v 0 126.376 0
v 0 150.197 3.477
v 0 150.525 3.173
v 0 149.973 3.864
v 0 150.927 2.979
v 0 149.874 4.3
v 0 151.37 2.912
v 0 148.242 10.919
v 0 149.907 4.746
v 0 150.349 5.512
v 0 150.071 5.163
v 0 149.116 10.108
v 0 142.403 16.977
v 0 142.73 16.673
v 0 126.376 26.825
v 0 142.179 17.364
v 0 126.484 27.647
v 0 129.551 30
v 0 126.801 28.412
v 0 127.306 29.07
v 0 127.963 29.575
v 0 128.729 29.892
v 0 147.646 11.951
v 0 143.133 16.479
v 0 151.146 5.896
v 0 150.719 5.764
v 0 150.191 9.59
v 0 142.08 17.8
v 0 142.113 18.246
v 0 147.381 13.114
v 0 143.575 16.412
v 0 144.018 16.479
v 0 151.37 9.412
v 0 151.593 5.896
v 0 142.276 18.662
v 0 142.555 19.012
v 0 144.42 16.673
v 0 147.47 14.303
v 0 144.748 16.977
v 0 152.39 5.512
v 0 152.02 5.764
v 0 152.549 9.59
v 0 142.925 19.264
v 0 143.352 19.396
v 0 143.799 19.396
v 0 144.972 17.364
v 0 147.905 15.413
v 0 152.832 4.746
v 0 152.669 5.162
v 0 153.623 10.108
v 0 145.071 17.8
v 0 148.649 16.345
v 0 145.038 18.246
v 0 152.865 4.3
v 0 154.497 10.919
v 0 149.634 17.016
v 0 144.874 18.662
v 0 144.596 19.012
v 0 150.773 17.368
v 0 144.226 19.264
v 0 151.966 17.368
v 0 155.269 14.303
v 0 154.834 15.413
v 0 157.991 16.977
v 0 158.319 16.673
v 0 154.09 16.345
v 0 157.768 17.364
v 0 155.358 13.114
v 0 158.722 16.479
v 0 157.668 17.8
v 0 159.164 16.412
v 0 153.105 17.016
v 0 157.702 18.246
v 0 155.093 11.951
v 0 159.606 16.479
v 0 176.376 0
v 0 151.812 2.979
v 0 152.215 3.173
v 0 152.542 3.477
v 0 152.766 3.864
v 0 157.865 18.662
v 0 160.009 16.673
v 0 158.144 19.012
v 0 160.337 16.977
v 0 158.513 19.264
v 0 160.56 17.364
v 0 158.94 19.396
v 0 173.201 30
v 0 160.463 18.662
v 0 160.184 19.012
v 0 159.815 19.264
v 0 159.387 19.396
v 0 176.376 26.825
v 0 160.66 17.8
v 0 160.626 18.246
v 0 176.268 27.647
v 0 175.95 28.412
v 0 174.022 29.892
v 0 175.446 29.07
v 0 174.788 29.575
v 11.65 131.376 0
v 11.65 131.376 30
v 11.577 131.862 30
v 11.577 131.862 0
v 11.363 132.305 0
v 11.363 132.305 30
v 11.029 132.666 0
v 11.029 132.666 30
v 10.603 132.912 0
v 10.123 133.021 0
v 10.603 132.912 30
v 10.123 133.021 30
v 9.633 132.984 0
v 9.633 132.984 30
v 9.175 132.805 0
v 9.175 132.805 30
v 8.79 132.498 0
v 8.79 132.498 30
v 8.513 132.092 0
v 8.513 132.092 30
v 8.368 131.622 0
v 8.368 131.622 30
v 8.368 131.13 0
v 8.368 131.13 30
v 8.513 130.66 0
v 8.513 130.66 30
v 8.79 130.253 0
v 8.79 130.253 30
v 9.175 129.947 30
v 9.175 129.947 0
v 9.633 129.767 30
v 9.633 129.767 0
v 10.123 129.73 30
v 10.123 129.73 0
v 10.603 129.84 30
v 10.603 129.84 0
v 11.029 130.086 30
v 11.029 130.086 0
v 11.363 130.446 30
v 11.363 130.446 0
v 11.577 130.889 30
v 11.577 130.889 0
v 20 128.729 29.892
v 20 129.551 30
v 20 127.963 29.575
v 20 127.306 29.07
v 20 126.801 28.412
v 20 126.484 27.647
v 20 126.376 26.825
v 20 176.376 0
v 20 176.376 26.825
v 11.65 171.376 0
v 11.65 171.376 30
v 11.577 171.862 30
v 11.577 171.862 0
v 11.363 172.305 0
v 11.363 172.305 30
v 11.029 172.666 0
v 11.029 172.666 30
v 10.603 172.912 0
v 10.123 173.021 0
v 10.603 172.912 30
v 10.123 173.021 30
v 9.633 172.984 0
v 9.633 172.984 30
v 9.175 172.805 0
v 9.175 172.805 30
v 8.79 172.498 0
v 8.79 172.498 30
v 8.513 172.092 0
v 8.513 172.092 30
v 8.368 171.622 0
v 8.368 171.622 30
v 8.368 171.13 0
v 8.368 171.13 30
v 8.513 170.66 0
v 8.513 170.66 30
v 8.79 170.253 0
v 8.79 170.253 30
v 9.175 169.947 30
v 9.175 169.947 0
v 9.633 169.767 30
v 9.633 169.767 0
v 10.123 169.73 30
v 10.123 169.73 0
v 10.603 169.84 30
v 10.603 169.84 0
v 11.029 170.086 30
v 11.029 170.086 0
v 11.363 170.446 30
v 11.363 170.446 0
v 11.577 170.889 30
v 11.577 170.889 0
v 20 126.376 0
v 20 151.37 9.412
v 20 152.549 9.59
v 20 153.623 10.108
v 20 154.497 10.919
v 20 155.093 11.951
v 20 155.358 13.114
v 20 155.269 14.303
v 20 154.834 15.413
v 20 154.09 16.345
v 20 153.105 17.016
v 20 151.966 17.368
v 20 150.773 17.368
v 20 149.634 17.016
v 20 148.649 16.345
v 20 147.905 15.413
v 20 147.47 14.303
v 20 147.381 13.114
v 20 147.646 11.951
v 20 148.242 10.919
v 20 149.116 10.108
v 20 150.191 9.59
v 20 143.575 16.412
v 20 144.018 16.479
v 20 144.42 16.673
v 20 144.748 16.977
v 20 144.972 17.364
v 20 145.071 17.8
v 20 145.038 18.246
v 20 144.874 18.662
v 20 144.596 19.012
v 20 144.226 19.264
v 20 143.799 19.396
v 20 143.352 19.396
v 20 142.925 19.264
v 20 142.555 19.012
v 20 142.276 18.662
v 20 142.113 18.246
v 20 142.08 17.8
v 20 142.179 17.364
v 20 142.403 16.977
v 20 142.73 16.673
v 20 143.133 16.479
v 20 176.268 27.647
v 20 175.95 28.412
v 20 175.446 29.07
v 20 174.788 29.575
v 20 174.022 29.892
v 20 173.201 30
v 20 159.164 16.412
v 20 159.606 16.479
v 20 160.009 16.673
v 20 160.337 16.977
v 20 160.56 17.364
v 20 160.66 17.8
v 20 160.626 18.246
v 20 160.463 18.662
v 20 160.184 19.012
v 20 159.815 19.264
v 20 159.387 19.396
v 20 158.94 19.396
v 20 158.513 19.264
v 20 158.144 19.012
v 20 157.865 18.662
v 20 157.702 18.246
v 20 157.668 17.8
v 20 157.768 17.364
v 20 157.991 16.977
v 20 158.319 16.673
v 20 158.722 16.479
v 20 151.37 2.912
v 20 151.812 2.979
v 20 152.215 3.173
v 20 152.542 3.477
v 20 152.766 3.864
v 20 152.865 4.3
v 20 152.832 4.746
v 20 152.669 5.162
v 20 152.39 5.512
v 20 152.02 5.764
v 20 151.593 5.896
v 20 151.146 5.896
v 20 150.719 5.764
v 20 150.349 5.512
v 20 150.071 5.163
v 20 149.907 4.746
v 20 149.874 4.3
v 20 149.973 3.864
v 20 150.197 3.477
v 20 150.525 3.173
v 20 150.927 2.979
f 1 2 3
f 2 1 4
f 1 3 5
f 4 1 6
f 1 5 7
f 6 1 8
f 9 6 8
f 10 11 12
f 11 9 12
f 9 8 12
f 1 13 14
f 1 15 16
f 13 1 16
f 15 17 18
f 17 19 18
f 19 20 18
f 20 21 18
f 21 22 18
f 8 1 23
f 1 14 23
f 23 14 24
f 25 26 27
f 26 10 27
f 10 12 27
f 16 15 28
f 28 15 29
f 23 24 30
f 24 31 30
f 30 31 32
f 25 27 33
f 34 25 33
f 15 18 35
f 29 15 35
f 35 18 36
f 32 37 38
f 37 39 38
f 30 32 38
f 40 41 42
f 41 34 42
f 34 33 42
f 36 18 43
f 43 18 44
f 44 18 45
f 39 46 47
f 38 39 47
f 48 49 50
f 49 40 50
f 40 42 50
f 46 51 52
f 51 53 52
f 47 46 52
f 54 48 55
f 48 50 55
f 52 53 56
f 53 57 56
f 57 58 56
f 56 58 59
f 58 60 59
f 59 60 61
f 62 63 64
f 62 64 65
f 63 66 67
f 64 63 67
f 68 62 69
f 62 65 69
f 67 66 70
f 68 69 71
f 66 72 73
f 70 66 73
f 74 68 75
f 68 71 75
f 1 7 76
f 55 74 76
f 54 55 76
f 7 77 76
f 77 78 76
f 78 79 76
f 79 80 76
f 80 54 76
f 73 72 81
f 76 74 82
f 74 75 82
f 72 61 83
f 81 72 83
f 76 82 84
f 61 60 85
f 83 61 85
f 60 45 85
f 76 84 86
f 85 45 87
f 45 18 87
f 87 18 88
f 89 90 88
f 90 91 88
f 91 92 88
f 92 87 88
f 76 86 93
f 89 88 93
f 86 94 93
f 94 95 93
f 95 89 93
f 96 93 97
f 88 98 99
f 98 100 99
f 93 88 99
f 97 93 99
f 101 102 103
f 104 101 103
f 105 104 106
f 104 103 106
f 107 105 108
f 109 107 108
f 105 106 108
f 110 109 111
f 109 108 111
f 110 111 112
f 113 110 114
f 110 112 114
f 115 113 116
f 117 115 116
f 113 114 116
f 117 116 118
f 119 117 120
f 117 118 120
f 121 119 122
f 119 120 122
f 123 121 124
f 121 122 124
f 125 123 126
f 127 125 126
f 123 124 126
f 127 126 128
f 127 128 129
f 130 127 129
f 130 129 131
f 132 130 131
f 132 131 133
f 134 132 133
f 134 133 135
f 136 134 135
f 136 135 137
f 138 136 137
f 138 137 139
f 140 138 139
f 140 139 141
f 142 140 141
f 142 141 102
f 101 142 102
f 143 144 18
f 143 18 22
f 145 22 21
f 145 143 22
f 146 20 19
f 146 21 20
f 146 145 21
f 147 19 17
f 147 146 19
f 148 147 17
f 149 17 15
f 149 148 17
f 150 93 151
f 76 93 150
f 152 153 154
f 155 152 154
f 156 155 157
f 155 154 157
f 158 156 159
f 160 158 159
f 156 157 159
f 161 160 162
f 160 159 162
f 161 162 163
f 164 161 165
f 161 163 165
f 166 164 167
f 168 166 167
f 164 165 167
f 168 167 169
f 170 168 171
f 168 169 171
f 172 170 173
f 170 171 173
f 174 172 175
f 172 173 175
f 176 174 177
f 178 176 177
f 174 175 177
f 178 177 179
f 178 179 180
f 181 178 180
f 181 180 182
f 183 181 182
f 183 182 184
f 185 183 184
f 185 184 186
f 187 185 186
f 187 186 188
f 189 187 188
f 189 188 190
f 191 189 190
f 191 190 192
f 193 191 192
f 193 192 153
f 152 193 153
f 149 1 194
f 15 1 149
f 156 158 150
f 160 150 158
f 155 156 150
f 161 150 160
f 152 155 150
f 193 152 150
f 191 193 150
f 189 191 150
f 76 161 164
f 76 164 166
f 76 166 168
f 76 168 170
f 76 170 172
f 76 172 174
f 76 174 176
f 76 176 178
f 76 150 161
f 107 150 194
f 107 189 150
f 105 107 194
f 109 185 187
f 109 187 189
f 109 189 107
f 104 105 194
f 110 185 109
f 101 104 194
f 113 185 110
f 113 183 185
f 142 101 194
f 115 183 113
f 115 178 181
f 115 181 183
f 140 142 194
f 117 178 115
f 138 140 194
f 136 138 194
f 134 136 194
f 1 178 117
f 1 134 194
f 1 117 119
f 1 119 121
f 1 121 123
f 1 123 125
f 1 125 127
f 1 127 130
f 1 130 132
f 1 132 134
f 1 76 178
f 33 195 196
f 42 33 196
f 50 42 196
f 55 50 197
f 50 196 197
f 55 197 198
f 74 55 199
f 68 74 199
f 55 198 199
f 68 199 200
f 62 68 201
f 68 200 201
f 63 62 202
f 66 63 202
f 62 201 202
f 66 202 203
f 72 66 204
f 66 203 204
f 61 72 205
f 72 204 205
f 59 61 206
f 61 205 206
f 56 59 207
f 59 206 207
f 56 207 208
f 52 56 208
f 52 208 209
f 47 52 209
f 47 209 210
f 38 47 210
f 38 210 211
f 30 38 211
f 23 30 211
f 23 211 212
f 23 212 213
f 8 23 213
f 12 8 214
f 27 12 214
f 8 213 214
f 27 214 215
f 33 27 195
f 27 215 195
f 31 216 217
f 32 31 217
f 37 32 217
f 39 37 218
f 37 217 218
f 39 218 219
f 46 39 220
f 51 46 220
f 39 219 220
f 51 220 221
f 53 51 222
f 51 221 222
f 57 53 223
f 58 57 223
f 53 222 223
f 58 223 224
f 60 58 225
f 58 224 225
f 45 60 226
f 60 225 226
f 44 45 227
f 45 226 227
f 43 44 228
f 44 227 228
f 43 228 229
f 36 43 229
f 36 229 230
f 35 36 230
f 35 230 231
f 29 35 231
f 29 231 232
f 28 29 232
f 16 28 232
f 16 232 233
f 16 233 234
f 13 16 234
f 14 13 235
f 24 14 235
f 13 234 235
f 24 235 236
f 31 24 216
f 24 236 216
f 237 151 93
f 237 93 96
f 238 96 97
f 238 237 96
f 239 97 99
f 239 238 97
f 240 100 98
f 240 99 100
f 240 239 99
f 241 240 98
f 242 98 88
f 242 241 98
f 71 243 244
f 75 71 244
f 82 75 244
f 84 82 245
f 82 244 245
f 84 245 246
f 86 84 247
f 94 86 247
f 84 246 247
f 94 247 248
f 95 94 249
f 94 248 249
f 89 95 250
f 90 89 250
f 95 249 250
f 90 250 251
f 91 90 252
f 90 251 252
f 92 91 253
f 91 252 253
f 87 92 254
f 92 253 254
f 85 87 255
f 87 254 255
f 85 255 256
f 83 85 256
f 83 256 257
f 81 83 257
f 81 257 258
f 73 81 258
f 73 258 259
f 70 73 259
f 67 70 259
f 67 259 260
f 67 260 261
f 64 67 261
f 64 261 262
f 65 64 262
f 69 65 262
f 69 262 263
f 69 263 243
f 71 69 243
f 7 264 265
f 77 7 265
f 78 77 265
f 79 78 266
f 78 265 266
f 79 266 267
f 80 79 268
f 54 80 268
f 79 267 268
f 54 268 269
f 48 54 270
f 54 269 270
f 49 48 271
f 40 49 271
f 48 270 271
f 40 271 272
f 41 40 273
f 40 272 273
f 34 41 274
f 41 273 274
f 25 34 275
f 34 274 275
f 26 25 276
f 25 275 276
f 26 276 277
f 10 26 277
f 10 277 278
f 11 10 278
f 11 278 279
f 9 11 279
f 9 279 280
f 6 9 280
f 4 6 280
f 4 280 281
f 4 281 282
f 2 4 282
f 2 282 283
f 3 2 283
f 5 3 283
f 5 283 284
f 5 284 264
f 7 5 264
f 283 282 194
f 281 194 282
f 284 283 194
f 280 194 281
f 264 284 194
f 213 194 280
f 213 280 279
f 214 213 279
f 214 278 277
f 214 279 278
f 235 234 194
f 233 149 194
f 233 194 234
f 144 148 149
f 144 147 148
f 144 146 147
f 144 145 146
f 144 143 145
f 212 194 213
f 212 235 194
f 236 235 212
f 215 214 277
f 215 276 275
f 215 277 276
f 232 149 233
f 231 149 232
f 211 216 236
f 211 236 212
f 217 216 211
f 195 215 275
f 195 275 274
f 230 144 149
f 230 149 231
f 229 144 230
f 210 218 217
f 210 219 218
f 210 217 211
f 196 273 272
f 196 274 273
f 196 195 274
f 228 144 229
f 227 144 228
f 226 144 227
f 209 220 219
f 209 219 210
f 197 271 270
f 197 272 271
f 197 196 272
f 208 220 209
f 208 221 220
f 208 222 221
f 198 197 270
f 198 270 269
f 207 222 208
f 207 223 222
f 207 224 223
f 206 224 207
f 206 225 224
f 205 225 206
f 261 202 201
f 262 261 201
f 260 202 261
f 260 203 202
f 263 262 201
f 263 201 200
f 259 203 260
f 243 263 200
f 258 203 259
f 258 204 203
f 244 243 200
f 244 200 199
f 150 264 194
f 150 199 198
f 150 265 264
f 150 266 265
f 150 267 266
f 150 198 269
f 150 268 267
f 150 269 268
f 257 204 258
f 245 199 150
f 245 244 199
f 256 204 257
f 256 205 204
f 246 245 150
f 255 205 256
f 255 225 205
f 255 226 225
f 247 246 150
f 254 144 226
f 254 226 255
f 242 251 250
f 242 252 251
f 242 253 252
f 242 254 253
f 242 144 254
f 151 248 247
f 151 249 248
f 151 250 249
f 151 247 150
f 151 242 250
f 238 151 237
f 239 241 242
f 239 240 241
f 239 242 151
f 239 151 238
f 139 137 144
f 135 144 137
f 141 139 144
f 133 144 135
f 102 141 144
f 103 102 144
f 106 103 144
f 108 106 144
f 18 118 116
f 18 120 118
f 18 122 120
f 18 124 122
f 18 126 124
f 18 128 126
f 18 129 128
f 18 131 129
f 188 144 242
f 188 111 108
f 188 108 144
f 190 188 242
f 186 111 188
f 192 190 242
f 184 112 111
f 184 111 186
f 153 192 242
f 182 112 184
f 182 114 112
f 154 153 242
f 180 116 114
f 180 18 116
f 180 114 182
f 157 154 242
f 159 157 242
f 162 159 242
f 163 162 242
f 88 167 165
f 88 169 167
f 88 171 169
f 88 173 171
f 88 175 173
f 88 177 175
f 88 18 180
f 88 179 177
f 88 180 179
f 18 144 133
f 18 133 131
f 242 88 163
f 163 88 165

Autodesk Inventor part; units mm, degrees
ref_plane "YZ Plane" through (0, 0, 0) normal (1, 0, 0) x (0, 1, 0)
ref_plane "XZ Plane" through (0, 0, 0) normal (0, 1, 0) x (-1, 0, 0)
ref_plane "XY Plane" through (0, 0, 0) normal (0, 0, 1) x (1, 0, 0)
sketch "Sketch1" plane through (0, 0, 0) normal (1, 0, 0) x (0, 1, 0)
  line L0 (176.3757, 0) -> (126.3757, 0)
  line L1 (126.3757, 0) -> (126.3757, 30)
  line L2 (126.3757, 30) -> (176.3757, 30)
  line L3 (176.3757, 30) -> (176.3757, 0)
  point P0 (0, 0)
  dimension "d0" = 30
  dimension "d1" = 50
extrude "Extrusion1" add sketch "Sketch1" along normal blind 20
fillet "Fillet1" radius 3.175 2 edges at (10, 126.3757, 30) (10, 176.3757, 30)
sketch "Sketch2" plane through (0, 129.5507, 30) normal (0, 0, 1) x (1, 0, 0)
  line L0 (0, 46.825) -> (20, 46.825) construction
  line L1 (10, 46.825) -> (10, -3.175) construction
  line L2 (0, -3.175) -> (20, -3.175) construction
  circle A0 centre (10, 41.825) radius 1.65
  circle A1 centre (10, 1.825) radius 1.65
  point P0 (0, -129.5507)
  dimension "d5" = 3.3
  dimension "d6" = 5
  dimension "d7" = 3.3
  dimension "d8" = 5
extrude "Extrusion2" cut sketch "Sketch2" against normal blind 30
sketch "Sketch3" plane through (20, 0, 0) normal (1, 0, 0) x (0, 0, -1)
  line L0 (-30, 173.2007) -> (-30, 129.5507) construction
  line L1 (-30, 151.3757) -> (12.6673, 151.3757) construction
  line L2 (-26.825, 126.3757) -> (0, 126.3757) construction
  line L3 (-13.4125, 126.3757) -> (-13.4125, 176.3636) construction
  circle A0 centre (-13.4125, 151.3696) radius 4
  point P0 (0, 0)
  dimension "d11" = 8
extrude "Extrusion3" cut sketch "Sketch3" against normal through all
sketch "Sketch4" plane through (20, 0, 0) normal (1, 0, 0) x (0, 0, -1)
  circle A0 centre (-13.4125, 151.3696) radius 12.5 construction
  circle A1 centre (-17.5297, 159.3727) radius 1.5 construction
  circle A2 centre (-13.4125, 151.3696) radius 5 construction
  circle A3 centre (-4.4231, 150.9337) radius 1.5 construction
  circle A4 centre (-18.2848, 143.8026) radius 1.5 construction
  circle A5 centre (-13.4125, 151.3696) radius 9 construction
  circle A6 centre (-4.4125, 151.3696) radius 1.5
  circle A7 centre (-17.9125, 159.1639) radius 1.5
  circle A8 centre (-17.9125, 143.5754) radius 1.5
  point P0 (0, 0)
  dimension "d16" = 360
extrude "Extrusion4" cut sketch "Sketch4" against normal through all
properties part number "Z Leadcrew Nut Holder"
